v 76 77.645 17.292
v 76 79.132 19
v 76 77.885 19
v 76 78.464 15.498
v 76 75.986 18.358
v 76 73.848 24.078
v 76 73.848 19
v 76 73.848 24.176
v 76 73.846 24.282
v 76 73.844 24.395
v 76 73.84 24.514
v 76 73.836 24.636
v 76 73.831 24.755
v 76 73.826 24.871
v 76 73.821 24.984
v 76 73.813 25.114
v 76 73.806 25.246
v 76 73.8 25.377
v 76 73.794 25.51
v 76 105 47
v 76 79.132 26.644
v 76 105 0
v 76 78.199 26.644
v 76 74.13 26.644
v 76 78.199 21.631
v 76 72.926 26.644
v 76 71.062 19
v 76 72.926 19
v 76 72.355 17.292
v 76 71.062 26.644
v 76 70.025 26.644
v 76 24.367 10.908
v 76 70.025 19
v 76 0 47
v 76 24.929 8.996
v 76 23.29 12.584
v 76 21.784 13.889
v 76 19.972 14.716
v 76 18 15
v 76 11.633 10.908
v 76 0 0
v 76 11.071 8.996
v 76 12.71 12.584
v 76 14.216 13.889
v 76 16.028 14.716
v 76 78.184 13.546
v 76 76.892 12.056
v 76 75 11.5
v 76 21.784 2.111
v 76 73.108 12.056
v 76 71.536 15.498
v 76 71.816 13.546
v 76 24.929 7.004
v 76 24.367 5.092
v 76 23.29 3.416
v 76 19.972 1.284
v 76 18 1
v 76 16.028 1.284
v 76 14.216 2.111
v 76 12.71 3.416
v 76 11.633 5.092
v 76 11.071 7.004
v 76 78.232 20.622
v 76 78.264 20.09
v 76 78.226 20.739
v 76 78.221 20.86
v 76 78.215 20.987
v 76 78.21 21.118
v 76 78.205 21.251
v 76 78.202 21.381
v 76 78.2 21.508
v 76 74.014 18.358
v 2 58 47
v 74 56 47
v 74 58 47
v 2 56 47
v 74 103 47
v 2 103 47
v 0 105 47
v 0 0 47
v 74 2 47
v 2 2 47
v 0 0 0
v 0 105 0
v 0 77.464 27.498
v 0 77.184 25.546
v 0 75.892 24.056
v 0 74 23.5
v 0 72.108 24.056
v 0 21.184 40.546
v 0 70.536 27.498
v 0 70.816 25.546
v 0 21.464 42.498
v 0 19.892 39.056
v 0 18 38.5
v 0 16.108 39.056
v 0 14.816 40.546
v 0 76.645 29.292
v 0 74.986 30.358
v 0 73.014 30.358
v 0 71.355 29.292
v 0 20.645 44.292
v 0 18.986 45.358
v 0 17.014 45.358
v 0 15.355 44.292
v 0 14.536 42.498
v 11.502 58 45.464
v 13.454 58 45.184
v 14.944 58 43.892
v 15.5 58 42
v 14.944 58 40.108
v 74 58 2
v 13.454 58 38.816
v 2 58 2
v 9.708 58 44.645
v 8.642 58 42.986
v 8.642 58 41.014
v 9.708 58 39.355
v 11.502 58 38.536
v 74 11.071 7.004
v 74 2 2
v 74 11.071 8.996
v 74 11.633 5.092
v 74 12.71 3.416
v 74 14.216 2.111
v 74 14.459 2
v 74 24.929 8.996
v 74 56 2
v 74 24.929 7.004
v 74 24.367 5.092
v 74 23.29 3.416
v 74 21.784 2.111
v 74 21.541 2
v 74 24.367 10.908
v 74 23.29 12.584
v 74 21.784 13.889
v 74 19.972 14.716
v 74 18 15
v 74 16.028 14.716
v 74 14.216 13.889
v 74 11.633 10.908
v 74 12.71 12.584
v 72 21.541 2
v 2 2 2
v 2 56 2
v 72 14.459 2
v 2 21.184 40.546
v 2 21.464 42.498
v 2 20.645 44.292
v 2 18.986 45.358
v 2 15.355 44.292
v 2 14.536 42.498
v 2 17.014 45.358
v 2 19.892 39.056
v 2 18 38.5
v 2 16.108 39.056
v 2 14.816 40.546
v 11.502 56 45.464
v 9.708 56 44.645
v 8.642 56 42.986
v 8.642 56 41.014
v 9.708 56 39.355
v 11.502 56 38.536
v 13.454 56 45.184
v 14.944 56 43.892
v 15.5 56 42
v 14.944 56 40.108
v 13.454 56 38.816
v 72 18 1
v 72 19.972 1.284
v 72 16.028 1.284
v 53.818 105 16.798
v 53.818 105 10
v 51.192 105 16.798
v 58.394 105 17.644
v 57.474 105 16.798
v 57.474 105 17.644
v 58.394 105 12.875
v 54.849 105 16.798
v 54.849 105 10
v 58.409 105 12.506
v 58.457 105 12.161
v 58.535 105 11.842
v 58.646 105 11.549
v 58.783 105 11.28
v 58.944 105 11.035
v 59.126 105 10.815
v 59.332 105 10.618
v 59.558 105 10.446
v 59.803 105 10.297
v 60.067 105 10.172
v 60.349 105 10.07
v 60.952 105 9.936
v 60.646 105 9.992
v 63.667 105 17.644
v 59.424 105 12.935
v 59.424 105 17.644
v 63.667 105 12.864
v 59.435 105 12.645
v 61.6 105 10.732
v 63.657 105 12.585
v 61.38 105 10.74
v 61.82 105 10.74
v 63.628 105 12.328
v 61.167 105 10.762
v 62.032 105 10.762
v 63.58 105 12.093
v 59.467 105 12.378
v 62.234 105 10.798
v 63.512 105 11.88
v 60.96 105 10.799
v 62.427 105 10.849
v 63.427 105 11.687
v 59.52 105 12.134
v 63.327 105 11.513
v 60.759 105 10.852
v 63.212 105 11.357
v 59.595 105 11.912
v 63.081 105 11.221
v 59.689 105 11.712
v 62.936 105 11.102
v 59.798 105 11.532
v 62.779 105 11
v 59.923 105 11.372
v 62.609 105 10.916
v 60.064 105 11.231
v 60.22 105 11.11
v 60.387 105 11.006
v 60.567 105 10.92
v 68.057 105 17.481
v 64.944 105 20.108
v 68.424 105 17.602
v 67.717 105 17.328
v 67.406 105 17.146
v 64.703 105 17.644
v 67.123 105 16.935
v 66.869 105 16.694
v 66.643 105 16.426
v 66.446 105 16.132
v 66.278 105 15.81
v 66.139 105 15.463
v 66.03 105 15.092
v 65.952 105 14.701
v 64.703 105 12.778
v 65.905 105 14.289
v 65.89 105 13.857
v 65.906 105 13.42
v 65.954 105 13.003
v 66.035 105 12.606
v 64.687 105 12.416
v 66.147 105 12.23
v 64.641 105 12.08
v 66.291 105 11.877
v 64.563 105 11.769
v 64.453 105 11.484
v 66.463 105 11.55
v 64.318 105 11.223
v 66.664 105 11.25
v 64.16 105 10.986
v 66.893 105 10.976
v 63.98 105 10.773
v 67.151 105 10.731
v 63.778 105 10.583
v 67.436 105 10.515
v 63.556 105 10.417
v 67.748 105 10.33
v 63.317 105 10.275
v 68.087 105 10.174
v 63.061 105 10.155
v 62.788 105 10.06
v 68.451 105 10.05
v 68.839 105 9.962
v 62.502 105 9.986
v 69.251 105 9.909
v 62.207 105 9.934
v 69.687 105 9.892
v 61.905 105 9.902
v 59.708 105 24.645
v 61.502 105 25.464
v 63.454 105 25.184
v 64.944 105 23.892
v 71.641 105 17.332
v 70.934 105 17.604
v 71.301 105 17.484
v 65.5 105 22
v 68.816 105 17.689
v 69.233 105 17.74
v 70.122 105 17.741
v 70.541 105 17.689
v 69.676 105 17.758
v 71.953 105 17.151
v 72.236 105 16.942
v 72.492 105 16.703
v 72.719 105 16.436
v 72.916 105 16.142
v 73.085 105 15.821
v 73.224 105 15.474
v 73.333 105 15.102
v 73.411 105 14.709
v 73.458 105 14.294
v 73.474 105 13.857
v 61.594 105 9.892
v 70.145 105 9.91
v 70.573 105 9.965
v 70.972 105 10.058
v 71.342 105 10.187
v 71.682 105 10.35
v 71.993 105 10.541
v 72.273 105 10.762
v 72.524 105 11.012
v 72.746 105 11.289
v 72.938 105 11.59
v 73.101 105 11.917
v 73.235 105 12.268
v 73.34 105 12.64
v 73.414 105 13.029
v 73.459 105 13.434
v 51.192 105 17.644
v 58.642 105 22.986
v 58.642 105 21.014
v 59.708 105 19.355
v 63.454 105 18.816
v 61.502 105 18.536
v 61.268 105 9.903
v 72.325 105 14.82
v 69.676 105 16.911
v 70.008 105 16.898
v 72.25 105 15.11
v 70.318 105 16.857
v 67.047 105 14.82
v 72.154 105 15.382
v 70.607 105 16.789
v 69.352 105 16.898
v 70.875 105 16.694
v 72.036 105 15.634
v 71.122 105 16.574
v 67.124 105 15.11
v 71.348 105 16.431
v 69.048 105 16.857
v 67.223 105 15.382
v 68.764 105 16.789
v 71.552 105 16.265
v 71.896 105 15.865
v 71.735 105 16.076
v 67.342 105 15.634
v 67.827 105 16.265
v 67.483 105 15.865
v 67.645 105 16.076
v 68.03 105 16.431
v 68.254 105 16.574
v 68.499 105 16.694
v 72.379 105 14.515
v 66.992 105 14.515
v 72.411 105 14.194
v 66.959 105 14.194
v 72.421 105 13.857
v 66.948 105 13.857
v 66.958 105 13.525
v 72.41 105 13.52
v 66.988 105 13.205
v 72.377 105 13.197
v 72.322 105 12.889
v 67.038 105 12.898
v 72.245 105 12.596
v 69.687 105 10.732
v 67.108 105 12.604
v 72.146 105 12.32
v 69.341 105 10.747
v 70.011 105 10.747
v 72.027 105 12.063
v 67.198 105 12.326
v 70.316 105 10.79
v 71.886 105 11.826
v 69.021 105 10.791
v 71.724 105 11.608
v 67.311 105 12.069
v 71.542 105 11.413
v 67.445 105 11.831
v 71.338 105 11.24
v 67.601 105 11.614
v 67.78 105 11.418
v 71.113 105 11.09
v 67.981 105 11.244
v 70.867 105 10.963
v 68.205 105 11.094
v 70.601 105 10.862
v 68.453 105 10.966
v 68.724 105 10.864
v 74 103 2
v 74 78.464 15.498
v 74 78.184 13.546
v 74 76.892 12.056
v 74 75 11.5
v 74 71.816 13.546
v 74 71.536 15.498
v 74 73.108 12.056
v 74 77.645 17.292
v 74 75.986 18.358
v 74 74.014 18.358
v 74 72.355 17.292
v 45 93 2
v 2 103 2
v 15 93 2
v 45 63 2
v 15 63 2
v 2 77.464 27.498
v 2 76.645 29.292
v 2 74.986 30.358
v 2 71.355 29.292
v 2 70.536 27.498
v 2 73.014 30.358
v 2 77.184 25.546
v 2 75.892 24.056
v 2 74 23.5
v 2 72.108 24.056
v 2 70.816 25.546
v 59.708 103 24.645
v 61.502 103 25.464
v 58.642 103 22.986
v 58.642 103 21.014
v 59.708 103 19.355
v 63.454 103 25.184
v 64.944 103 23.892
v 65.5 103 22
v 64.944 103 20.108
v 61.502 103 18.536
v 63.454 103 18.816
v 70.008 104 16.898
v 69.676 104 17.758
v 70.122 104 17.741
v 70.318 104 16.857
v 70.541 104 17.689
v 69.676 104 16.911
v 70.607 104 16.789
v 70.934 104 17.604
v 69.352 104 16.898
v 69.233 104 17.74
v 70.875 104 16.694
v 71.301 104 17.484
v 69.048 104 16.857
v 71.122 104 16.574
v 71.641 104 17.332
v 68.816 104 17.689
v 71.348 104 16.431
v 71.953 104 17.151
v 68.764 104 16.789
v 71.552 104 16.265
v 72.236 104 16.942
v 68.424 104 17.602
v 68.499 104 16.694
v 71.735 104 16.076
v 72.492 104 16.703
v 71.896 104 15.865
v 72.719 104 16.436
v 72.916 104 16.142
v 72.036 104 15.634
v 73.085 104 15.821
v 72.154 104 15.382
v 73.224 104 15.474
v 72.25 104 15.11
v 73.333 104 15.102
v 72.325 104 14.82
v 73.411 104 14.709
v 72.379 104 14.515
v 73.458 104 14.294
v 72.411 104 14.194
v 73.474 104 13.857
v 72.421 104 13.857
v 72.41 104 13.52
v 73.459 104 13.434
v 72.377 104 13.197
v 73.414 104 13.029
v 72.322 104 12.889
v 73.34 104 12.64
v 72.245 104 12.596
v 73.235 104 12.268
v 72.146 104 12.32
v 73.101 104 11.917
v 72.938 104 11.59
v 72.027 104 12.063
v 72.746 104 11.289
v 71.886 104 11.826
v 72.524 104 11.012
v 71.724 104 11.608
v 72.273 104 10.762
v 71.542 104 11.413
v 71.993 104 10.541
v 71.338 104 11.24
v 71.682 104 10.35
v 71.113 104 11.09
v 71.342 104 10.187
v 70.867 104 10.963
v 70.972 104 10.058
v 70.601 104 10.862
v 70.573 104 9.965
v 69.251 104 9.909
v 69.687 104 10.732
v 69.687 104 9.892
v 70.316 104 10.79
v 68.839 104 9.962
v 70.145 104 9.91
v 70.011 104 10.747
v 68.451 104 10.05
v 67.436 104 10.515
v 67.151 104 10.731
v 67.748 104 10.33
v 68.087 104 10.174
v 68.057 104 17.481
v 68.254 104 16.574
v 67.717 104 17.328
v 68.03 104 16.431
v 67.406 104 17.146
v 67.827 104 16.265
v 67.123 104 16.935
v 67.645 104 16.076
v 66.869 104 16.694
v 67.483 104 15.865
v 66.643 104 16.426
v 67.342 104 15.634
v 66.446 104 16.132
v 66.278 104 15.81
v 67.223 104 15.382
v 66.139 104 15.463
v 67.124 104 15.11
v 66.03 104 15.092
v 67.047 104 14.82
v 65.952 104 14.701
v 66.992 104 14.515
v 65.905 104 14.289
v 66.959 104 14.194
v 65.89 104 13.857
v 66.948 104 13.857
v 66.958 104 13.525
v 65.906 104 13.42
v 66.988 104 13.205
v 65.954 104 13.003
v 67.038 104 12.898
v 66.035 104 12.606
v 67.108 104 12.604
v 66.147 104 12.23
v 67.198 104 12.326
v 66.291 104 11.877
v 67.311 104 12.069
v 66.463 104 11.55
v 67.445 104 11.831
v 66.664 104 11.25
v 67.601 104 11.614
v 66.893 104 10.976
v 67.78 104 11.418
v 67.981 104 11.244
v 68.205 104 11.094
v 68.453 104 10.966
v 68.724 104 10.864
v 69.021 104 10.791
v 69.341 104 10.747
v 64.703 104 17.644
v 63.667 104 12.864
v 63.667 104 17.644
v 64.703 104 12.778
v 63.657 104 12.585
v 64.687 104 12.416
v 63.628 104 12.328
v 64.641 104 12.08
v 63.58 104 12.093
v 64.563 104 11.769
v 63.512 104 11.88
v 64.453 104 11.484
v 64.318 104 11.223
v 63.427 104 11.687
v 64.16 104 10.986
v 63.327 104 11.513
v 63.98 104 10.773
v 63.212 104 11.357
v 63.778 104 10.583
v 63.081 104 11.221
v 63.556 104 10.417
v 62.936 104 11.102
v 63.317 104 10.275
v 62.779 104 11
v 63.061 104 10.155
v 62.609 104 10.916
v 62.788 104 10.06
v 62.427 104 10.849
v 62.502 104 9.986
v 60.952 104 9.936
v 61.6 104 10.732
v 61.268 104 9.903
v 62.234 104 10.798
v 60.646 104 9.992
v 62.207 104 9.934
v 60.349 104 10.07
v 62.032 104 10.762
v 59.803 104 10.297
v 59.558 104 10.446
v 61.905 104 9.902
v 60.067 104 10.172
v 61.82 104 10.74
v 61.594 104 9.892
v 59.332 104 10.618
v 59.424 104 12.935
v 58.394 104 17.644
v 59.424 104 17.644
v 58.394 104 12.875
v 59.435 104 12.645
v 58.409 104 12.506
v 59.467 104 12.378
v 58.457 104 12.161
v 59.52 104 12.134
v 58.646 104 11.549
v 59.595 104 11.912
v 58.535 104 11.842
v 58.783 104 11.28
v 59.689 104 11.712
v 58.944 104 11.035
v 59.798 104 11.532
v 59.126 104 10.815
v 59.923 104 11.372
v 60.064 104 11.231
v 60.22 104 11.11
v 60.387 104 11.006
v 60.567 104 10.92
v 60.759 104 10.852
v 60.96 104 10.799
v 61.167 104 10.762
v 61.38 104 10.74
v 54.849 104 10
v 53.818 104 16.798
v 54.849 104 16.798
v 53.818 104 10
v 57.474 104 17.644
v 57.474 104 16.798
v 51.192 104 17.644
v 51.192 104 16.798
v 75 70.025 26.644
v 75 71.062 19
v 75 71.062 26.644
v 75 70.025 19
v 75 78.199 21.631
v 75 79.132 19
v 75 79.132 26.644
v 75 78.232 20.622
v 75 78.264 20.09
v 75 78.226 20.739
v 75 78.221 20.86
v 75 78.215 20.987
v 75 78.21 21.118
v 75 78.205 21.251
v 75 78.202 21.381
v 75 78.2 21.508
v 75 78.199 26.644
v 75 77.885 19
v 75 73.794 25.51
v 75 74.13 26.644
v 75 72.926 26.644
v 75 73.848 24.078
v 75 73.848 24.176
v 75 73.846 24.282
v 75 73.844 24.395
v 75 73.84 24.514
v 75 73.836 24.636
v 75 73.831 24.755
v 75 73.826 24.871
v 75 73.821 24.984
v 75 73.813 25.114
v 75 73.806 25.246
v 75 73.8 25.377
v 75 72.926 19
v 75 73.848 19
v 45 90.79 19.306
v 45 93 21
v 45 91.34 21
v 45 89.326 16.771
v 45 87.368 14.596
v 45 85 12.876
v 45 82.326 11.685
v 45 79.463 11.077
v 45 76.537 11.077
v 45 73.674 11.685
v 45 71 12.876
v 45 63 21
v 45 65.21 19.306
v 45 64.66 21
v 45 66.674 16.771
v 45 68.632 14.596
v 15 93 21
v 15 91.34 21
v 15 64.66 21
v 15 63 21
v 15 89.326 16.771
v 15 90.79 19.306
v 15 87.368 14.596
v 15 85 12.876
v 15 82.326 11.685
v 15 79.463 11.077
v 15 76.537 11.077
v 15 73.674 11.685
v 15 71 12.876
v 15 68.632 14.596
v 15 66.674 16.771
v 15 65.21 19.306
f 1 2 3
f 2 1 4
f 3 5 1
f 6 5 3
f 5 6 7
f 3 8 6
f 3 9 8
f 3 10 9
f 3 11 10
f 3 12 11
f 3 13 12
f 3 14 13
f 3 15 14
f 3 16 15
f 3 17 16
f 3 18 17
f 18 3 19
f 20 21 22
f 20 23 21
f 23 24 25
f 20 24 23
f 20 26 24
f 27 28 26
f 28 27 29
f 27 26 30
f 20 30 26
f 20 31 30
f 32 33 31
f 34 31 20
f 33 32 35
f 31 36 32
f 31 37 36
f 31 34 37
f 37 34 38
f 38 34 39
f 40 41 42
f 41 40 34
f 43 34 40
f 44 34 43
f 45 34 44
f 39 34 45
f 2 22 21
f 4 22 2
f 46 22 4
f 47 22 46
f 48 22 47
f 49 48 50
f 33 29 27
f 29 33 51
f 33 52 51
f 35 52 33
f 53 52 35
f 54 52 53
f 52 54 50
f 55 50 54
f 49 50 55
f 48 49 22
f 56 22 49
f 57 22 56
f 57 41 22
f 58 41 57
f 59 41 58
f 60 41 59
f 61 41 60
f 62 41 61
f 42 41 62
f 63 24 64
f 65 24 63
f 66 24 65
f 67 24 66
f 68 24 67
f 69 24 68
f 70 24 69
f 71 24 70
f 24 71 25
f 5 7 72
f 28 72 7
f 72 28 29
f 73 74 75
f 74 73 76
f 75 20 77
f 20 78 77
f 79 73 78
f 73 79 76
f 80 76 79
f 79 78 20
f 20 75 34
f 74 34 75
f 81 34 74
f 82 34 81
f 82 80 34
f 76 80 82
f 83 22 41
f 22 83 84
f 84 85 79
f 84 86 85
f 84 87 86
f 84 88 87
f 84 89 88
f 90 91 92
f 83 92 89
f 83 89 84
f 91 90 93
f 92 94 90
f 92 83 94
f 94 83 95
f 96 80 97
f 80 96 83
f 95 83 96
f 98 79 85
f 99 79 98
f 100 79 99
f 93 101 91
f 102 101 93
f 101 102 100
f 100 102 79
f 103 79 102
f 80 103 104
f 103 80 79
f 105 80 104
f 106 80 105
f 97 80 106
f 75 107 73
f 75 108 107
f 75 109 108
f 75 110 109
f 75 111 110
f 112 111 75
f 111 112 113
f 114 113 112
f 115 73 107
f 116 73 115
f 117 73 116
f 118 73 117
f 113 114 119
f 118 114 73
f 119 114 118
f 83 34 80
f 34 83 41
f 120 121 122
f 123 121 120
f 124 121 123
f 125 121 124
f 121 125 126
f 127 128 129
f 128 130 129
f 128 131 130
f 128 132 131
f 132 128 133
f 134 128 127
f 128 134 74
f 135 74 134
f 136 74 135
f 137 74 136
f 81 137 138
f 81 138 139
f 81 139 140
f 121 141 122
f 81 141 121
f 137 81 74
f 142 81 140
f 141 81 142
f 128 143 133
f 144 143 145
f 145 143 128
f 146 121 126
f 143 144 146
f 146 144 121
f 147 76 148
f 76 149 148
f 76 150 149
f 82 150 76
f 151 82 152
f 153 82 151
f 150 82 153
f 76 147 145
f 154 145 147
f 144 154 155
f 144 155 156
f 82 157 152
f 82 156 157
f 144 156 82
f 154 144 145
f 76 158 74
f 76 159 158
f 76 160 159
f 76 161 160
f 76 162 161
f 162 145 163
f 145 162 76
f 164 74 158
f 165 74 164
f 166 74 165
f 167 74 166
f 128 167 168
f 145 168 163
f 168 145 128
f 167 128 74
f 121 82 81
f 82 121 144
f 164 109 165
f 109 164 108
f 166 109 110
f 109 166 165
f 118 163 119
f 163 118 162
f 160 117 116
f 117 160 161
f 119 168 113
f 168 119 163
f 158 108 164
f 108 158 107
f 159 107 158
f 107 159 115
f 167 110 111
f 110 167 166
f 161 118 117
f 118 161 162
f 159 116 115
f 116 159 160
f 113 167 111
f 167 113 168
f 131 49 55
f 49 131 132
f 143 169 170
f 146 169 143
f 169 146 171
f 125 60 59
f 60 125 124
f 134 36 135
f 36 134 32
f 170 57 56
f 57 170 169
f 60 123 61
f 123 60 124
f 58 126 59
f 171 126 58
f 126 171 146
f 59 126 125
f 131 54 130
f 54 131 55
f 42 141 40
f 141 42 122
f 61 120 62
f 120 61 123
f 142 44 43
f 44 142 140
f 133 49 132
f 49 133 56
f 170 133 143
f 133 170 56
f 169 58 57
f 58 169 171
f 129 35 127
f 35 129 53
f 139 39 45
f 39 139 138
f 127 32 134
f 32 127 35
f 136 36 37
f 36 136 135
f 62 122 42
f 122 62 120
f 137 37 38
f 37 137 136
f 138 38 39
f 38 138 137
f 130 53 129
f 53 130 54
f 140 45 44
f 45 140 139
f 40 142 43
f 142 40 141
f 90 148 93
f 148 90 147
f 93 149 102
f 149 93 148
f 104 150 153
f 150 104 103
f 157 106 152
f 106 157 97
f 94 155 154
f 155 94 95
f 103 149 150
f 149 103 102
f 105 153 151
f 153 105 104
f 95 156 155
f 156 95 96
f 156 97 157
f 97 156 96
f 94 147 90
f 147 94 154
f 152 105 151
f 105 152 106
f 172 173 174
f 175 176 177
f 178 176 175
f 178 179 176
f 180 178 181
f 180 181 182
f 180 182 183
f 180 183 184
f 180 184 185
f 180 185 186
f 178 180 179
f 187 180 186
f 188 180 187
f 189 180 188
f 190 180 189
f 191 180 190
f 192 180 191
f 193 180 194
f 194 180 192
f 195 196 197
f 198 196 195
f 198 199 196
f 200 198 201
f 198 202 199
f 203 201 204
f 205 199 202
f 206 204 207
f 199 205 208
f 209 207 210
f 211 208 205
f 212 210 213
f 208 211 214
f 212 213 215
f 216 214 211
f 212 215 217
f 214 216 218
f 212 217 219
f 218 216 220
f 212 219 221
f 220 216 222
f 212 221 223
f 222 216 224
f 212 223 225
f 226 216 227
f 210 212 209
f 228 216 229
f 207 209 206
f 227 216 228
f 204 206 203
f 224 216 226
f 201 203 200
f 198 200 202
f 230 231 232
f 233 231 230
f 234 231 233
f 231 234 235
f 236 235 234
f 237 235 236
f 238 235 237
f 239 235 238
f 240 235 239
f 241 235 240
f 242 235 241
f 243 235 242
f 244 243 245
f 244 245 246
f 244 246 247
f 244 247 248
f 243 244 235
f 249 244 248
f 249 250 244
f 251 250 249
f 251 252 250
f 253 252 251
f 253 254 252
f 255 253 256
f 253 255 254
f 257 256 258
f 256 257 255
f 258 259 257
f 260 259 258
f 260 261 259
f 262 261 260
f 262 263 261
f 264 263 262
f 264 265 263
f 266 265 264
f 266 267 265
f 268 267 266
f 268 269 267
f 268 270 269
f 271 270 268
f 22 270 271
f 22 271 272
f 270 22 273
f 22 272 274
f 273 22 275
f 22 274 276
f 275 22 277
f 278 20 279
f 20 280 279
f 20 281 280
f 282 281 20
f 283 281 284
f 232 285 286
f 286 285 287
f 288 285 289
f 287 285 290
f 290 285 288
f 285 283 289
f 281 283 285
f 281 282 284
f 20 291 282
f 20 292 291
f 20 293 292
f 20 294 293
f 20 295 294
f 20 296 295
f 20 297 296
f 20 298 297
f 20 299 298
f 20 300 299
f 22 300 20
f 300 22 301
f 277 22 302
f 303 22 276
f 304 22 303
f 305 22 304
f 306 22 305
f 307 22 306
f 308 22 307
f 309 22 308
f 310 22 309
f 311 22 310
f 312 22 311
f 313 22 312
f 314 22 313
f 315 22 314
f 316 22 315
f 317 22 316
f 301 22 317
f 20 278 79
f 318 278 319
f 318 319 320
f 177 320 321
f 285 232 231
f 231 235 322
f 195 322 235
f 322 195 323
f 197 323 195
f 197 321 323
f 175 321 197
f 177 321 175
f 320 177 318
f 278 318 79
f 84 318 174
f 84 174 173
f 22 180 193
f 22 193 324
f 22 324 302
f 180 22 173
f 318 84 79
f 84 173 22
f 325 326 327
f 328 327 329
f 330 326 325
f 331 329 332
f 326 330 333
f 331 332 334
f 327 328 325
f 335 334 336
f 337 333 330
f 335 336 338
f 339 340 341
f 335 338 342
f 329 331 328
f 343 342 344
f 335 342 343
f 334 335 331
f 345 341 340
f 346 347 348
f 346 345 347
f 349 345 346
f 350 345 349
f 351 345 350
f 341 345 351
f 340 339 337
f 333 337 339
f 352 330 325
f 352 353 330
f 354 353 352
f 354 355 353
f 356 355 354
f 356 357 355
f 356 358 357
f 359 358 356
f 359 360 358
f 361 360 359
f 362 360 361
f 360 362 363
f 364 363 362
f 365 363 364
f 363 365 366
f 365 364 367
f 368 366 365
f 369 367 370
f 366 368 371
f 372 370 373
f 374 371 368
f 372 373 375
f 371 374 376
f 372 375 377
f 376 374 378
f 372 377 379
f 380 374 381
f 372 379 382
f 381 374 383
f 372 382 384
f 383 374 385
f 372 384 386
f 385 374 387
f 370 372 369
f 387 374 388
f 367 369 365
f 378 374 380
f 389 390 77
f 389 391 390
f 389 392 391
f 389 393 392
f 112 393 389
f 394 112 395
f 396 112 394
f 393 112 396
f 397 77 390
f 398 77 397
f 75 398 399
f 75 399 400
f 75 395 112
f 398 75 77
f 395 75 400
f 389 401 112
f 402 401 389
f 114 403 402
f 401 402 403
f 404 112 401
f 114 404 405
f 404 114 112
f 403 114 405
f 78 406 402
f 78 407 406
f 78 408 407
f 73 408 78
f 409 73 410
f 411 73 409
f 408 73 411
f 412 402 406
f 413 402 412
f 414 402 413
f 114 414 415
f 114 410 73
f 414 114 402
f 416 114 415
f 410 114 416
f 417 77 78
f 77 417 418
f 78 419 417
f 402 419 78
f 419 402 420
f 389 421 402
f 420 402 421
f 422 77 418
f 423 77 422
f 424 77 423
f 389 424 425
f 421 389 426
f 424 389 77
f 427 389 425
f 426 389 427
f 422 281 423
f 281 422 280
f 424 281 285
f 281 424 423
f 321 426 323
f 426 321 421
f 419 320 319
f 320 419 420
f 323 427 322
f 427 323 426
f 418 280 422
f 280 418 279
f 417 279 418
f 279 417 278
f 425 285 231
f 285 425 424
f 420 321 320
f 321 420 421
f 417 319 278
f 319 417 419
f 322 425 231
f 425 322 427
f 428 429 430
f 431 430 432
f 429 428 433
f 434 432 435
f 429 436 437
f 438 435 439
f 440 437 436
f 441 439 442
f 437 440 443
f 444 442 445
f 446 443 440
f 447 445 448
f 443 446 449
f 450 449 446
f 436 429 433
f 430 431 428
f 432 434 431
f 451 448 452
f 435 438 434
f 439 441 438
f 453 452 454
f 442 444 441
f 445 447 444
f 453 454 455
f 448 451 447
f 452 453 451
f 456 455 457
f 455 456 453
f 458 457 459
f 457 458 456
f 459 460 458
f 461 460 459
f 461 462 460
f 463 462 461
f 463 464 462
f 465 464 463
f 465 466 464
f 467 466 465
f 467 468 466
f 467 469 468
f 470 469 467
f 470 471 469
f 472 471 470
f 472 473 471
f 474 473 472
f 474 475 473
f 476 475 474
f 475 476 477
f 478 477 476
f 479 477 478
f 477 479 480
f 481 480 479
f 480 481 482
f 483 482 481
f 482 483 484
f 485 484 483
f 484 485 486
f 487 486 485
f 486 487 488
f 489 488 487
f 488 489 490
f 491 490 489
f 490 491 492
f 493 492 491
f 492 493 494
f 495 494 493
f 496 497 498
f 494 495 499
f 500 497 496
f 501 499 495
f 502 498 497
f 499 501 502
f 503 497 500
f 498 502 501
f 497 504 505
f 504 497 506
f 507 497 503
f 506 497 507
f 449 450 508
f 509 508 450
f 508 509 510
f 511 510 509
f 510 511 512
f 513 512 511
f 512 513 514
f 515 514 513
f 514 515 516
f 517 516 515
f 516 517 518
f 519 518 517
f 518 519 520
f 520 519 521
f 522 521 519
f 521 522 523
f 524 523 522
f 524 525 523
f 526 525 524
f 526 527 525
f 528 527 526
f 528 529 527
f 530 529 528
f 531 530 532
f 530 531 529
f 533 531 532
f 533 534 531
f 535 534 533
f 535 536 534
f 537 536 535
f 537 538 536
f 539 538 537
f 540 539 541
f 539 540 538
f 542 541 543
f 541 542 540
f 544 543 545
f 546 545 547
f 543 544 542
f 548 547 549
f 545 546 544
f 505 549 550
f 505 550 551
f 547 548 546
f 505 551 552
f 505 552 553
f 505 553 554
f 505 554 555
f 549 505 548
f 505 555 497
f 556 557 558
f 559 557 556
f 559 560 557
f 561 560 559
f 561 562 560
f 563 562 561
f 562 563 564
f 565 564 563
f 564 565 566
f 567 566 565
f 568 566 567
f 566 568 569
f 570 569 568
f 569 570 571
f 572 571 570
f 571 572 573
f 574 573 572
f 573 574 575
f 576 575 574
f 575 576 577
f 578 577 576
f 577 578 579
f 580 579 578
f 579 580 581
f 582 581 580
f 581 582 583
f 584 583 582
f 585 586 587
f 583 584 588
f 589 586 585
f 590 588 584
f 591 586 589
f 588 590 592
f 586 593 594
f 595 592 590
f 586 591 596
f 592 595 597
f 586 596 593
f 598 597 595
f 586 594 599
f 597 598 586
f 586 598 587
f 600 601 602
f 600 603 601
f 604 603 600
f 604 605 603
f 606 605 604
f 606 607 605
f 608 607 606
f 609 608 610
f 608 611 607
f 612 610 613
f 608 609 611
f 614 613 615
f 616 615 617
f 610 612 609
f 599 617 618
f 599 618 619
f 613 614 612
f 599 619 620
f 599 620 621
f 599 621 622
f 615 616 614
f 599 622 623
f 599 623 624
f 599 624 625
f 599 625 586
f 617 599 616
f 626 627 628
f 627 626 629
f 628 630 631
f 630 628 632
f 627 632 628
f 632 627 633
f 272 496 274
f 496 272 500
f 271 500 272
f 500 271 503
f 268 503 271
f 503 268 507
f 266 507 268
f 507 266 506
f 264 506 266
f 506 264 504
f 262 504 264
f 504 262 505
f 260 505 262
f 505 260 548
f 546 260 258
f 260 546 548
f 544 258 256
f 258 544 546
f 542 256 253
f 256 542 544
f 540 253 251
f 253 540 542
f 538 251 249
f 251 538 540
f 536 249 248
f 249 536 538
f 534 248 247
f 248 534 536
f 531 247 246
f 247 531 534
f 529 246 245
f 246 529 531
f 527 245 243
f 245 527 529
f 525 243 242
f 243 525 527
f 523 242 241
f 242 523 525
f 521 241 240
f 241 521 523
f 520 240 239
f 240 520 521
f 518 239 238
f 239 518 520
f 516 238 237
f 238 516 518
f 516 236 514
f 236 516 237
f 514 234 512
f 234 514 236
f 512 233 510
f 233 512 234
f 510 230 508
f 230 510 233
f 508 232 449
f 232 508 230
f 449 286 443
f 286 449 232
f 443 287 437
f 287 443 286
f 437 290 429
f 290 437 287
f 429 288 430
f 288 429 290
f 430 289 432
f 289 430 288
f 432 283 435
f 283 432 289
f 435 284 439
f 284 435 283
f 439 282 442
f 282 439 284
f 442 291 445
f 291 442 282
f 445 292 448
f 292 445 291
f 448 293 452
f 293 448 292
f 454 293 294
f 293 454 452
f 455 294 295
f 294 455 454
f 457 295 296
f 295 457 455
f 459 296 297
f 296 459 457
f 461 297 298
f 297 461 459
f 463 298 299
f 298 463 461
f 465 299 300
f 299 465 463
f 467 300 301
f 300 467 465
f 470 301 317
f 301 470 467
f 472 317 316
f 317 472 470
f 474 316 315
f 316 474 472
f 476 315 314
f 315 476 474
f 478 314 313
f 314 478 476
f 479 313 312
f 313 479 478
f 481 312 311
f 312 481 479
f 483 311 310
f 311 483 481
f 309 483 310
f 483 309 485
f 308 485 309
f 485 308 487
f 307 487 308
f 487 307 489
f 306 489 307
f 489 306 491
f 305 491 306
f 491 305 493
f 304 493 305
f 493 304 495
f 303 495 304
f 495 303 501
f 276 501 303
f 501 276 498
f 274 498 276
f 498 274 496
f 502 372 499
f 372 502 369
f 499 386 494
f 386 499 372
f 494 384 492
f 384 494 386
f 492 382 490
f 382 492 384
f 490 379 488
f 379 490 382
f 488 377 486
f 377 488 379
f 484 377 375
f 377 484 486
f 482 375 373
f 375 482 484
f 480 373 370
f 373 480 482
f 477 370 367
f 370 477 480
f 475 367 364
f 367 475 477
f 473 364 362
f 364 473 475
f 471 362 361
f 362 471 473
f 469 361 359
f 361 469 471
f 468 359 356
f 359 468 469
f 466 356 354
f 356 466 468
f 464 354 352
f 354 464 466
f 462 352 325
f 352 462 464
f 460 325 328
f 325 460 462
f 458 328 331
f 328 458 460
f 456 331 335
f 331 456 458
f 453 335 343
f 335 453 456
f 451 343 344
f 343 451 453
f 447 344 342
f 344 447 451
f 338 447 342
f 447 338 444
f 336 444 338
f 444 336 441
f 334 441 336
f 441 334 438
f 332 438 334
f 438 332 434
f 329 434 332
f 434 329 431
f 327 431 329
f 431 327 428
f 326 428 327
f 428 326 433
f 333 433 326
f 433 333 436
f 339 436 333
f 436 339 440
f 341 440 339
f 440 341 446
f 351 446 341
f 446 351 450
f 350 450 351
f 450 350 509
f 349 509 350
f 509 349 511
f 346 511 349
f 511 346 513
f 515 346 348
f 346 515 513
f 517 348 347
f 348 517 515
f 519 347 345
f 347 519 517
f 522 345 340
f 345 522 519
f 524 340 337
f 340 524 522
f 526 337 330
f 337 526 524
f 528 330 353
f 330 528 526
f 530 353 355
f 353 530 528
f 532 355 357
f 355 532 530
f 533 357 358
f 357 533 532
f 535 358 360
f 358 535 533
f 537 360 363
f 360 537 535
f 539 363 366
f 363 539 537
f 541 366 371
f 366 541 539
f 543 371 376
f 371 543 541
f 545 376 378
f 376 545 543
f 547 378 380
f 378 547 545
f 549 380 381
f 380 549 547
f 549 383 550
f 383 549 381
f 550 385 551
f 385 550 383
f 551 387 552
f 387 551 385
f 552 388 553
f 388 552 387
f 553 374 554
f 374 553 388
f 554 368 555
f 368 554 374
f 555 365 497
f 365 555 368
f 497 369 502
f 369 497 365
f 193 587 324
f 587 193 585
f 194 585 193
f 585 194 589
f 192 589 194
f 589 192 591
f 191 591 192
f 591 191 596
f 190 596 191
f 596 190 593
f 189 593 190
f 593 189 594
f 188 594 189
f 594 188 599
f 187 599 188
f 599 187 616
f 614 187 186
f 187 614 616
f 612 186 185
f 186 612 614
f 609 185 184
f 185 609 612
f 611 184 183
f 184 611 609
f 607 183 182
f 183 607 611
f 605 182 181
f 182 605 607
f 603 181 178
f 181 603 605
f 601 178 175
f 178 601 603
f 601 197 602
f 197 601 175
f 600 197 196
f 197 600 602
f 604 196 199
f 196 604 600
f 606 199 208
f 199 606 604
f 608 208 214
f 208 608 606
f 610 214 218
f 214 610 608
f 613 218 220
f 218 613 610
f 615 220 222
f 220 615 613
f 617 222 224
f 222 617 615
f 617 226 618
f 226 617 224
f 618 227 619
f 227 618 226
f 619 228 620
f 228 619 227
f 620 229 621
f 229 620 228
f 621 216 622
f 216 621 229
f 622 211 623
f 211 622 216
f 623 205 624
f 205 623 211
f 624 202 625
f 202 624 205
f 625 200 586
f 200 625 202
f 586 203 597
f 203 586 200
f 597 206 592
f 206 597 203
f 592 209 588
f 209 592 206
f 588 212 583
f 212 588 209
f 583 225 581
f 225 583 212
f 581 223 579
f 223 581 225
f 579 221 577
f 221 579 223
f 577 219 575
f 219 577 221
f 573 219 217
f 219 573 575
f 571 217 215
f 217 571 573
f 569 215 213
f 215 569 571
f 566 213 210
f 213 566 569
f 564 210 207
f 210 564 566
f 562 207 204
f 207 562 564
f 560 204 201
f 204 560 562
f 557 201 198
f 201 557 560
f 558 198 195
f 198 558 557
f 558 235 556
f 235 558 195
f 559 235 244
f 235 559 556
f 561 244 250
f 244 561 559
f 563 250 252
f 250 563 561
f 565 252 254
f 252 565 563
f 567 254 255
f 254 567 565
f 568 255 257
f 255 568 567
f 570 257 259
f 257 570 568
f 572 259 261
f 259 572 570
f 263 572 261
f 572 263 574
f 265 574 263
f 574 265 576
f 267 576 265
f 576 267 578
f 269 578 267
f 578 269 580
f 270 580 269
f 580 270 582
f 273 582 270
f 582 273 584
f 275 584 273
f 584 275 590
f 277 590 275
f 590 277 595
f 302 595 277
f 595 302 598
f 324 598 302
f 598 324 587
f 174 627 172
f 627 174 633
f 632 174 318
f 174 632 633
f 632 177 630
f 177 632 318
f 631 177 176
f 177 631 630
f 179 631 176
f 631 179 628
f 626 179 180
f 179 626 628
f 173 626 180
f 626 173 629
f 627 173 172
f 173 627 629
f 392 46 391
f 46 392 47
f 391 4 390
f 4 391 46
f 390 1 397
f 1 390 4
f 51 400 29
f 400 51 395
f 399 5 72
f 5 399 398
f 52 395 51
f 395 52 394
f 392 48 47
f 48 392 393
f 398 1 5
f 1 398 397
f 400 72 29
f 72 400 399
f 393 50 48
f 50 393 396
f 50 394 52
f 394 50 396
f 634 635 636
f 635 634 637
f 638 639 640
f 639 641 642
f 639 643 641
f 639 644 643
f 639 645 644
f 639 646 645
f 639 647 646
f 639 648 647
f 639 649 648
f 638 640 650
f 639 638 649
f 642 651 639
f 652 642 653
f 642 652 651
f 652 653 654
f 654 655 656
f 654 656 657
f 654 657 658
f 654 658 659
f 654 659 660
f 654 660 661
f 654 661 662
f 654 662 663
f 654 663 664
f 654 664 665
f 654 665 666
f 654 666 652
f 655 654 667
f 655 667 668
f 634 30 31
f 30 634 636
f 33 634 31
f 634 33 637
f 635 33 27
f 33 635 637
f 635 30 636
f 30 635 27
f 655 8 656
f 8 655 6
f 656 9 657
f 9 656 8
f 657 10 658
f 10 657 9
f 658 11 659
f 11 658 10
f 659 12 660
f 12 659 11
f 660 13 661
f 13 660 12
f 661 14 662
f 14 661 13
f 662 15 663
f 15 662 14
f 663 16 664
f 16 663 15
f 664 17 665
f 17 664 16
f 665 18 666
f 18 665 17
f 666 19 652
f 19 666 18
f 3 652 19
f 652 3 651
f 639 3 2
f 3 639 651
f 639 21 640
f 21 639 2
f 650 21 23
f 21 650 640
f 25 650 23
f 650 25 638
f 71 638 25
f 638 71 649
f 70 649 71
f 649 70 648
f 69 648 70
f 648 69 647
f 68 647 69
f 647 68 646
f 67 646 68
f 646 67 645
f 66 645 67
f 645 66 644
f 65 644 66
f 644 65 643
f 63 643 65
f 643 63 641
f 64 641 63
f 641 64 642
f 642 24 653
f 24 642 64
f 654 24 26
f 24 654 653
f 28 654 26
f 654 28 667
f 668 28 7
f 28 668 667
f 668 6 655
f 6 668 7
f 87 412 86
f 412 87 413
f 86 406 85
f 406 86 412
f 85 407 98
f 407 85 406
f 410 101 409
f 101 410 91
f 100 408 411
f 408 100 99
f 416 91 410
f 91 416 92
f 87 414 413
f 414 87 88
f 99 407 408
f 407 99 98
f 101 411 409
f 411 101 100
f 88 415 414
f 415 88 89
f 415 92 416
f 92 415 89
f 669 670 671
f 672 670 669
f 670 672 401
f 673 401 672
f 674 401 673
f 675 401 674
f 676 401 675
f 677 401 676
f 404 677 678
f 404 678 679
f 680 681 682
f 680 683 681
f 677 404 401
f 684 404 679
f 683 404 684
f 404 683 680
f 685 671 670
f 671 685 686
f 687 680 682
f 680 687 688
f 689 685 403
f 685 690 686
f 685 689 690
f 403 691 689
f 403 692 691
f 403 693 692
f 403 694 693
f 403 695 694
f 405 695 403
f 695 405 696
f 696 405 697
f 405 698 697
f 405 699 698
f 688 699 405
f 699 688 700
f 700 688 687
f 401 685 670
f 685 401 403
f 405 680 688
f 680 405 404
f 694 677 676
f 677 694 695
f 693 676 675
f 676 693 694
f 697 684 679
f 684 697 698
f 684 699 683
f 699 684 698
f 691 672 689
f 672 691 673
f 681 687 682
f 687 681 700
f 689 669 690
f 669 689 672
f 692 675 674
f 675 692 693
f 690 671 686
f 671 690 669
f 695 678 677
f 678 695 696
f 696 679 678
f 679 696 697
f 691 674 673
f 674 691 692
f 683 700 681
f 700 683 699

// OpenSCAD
box_height=45;

arduino_length=72;
arduino_width=54;
arduino_height=24;
arduino_power_plug_width=16;
arduino_power_plug_height=6;
arduino_power_plug_radius=7;

motor_width=45;
motor_power_plug_width=16;
motor_power_plug_height=25;
tube_diameter=7;

out_height=20;
out_length=14;

in_height=13;
in_width=30;

cable_path_length=10;
cable_path_height=40;

// Which side the sensor
sensor_width=16;
sensor_height=40;

thickness=2;

motor_bed_position_length=15;
motor_bed_position_width=5;
motor_bed_length=30;
motor_bed_width=30;
motor_bed_height=19;
motor_bed_height_lower=25;
motor_diameter=28;

difference() {
	cube([arduino_length + 2 * thickness, arduino_width + 2 * thickness, box_height + thickness]);
	translate ([thickness, thickness, thickness]) cube([arduino_length, arduino_width, box_height]);
        translate([cable_path_length + thickness, arduino_width + 2 * thickness + 1, cable_path_height + thickness]) rotate([90, 0, 0]) cylinder(2 * thickness, r=tube_diameter/2);
	translate([arduino_length, arduino_power_plug_width + 1 * thickness, arduino_power_plug_height + thickness]) rotate([0, 90, 0]) cylinder(2 * thickness, r=arduino_power_plug_radius);
        translate([-1, sensor_width + 1 * thickness, sensor_height + thickness]) rotate([0, 90, 0]) cylinder(2 * thickness, r=tube_diameter/2);
}

translate([0, arduino_width + 2 * thickness, 0]) {
    // motor frame
    difference() {
	cube([arduino_length + 2 * thickness, motor_width + 1 * thickness, box_height + thickness]);
	translate ([thickness, 0, thickness]) cube([arduino_length, motor_width, box_height]);
	translate([arduino_length + 2 * thickness - out_length, motor_width + 1 * thickness,out_height + thickness]) rotate([90, 0, 0]) cylinder(2 * thickness, r=tube_diameter/2);
        translate([arduino_length + 2 * thickness - out_length + 12, motor_width + thickness/2, out_height + thickness - 12]) rotate([-90, 180, 0]) linear_extrude(thickness / 2) text("OUT", size=8);
        translate([arduino_length + 1, motor_width + 1 * thickness - in_width, in_height + thickness]) rotate([0, 90, 0]) cylinder(2 * thickness, r=tube_diameter/2);
        translate([arduino_length + 1.5 * thickness, motor_width - in_width - 4, in_height + thickness + 4]) rotate([90, 0, 90]) linear_extrude(thickness / 2) text("IN", size=8); 
        translate([-1, motor_power_plug_width, motor_power_plug_height + thickness]) rotate([0, 90, 0]) cylinder(2 * thickness, r=tube_diameter/2); 
    }
        
    //motorbed
    difference() {
        translate([motor_bed_position_length, motor_bed_position_width, thickness]) cube([motor_bed_length, motor_bed_width, motor_bed_height]);
        translate([motor_bed_position_length - motor_bed_width, motor_bed_position_width + motor_diameter/2 + (motor_bed_width - motor_diameter) / 2, motor_bed_height_lower]) rotate([90, 0, 90]) cylinder(motor_bed_width * 2, r=motor_diameter/2);    
    }
    
}
